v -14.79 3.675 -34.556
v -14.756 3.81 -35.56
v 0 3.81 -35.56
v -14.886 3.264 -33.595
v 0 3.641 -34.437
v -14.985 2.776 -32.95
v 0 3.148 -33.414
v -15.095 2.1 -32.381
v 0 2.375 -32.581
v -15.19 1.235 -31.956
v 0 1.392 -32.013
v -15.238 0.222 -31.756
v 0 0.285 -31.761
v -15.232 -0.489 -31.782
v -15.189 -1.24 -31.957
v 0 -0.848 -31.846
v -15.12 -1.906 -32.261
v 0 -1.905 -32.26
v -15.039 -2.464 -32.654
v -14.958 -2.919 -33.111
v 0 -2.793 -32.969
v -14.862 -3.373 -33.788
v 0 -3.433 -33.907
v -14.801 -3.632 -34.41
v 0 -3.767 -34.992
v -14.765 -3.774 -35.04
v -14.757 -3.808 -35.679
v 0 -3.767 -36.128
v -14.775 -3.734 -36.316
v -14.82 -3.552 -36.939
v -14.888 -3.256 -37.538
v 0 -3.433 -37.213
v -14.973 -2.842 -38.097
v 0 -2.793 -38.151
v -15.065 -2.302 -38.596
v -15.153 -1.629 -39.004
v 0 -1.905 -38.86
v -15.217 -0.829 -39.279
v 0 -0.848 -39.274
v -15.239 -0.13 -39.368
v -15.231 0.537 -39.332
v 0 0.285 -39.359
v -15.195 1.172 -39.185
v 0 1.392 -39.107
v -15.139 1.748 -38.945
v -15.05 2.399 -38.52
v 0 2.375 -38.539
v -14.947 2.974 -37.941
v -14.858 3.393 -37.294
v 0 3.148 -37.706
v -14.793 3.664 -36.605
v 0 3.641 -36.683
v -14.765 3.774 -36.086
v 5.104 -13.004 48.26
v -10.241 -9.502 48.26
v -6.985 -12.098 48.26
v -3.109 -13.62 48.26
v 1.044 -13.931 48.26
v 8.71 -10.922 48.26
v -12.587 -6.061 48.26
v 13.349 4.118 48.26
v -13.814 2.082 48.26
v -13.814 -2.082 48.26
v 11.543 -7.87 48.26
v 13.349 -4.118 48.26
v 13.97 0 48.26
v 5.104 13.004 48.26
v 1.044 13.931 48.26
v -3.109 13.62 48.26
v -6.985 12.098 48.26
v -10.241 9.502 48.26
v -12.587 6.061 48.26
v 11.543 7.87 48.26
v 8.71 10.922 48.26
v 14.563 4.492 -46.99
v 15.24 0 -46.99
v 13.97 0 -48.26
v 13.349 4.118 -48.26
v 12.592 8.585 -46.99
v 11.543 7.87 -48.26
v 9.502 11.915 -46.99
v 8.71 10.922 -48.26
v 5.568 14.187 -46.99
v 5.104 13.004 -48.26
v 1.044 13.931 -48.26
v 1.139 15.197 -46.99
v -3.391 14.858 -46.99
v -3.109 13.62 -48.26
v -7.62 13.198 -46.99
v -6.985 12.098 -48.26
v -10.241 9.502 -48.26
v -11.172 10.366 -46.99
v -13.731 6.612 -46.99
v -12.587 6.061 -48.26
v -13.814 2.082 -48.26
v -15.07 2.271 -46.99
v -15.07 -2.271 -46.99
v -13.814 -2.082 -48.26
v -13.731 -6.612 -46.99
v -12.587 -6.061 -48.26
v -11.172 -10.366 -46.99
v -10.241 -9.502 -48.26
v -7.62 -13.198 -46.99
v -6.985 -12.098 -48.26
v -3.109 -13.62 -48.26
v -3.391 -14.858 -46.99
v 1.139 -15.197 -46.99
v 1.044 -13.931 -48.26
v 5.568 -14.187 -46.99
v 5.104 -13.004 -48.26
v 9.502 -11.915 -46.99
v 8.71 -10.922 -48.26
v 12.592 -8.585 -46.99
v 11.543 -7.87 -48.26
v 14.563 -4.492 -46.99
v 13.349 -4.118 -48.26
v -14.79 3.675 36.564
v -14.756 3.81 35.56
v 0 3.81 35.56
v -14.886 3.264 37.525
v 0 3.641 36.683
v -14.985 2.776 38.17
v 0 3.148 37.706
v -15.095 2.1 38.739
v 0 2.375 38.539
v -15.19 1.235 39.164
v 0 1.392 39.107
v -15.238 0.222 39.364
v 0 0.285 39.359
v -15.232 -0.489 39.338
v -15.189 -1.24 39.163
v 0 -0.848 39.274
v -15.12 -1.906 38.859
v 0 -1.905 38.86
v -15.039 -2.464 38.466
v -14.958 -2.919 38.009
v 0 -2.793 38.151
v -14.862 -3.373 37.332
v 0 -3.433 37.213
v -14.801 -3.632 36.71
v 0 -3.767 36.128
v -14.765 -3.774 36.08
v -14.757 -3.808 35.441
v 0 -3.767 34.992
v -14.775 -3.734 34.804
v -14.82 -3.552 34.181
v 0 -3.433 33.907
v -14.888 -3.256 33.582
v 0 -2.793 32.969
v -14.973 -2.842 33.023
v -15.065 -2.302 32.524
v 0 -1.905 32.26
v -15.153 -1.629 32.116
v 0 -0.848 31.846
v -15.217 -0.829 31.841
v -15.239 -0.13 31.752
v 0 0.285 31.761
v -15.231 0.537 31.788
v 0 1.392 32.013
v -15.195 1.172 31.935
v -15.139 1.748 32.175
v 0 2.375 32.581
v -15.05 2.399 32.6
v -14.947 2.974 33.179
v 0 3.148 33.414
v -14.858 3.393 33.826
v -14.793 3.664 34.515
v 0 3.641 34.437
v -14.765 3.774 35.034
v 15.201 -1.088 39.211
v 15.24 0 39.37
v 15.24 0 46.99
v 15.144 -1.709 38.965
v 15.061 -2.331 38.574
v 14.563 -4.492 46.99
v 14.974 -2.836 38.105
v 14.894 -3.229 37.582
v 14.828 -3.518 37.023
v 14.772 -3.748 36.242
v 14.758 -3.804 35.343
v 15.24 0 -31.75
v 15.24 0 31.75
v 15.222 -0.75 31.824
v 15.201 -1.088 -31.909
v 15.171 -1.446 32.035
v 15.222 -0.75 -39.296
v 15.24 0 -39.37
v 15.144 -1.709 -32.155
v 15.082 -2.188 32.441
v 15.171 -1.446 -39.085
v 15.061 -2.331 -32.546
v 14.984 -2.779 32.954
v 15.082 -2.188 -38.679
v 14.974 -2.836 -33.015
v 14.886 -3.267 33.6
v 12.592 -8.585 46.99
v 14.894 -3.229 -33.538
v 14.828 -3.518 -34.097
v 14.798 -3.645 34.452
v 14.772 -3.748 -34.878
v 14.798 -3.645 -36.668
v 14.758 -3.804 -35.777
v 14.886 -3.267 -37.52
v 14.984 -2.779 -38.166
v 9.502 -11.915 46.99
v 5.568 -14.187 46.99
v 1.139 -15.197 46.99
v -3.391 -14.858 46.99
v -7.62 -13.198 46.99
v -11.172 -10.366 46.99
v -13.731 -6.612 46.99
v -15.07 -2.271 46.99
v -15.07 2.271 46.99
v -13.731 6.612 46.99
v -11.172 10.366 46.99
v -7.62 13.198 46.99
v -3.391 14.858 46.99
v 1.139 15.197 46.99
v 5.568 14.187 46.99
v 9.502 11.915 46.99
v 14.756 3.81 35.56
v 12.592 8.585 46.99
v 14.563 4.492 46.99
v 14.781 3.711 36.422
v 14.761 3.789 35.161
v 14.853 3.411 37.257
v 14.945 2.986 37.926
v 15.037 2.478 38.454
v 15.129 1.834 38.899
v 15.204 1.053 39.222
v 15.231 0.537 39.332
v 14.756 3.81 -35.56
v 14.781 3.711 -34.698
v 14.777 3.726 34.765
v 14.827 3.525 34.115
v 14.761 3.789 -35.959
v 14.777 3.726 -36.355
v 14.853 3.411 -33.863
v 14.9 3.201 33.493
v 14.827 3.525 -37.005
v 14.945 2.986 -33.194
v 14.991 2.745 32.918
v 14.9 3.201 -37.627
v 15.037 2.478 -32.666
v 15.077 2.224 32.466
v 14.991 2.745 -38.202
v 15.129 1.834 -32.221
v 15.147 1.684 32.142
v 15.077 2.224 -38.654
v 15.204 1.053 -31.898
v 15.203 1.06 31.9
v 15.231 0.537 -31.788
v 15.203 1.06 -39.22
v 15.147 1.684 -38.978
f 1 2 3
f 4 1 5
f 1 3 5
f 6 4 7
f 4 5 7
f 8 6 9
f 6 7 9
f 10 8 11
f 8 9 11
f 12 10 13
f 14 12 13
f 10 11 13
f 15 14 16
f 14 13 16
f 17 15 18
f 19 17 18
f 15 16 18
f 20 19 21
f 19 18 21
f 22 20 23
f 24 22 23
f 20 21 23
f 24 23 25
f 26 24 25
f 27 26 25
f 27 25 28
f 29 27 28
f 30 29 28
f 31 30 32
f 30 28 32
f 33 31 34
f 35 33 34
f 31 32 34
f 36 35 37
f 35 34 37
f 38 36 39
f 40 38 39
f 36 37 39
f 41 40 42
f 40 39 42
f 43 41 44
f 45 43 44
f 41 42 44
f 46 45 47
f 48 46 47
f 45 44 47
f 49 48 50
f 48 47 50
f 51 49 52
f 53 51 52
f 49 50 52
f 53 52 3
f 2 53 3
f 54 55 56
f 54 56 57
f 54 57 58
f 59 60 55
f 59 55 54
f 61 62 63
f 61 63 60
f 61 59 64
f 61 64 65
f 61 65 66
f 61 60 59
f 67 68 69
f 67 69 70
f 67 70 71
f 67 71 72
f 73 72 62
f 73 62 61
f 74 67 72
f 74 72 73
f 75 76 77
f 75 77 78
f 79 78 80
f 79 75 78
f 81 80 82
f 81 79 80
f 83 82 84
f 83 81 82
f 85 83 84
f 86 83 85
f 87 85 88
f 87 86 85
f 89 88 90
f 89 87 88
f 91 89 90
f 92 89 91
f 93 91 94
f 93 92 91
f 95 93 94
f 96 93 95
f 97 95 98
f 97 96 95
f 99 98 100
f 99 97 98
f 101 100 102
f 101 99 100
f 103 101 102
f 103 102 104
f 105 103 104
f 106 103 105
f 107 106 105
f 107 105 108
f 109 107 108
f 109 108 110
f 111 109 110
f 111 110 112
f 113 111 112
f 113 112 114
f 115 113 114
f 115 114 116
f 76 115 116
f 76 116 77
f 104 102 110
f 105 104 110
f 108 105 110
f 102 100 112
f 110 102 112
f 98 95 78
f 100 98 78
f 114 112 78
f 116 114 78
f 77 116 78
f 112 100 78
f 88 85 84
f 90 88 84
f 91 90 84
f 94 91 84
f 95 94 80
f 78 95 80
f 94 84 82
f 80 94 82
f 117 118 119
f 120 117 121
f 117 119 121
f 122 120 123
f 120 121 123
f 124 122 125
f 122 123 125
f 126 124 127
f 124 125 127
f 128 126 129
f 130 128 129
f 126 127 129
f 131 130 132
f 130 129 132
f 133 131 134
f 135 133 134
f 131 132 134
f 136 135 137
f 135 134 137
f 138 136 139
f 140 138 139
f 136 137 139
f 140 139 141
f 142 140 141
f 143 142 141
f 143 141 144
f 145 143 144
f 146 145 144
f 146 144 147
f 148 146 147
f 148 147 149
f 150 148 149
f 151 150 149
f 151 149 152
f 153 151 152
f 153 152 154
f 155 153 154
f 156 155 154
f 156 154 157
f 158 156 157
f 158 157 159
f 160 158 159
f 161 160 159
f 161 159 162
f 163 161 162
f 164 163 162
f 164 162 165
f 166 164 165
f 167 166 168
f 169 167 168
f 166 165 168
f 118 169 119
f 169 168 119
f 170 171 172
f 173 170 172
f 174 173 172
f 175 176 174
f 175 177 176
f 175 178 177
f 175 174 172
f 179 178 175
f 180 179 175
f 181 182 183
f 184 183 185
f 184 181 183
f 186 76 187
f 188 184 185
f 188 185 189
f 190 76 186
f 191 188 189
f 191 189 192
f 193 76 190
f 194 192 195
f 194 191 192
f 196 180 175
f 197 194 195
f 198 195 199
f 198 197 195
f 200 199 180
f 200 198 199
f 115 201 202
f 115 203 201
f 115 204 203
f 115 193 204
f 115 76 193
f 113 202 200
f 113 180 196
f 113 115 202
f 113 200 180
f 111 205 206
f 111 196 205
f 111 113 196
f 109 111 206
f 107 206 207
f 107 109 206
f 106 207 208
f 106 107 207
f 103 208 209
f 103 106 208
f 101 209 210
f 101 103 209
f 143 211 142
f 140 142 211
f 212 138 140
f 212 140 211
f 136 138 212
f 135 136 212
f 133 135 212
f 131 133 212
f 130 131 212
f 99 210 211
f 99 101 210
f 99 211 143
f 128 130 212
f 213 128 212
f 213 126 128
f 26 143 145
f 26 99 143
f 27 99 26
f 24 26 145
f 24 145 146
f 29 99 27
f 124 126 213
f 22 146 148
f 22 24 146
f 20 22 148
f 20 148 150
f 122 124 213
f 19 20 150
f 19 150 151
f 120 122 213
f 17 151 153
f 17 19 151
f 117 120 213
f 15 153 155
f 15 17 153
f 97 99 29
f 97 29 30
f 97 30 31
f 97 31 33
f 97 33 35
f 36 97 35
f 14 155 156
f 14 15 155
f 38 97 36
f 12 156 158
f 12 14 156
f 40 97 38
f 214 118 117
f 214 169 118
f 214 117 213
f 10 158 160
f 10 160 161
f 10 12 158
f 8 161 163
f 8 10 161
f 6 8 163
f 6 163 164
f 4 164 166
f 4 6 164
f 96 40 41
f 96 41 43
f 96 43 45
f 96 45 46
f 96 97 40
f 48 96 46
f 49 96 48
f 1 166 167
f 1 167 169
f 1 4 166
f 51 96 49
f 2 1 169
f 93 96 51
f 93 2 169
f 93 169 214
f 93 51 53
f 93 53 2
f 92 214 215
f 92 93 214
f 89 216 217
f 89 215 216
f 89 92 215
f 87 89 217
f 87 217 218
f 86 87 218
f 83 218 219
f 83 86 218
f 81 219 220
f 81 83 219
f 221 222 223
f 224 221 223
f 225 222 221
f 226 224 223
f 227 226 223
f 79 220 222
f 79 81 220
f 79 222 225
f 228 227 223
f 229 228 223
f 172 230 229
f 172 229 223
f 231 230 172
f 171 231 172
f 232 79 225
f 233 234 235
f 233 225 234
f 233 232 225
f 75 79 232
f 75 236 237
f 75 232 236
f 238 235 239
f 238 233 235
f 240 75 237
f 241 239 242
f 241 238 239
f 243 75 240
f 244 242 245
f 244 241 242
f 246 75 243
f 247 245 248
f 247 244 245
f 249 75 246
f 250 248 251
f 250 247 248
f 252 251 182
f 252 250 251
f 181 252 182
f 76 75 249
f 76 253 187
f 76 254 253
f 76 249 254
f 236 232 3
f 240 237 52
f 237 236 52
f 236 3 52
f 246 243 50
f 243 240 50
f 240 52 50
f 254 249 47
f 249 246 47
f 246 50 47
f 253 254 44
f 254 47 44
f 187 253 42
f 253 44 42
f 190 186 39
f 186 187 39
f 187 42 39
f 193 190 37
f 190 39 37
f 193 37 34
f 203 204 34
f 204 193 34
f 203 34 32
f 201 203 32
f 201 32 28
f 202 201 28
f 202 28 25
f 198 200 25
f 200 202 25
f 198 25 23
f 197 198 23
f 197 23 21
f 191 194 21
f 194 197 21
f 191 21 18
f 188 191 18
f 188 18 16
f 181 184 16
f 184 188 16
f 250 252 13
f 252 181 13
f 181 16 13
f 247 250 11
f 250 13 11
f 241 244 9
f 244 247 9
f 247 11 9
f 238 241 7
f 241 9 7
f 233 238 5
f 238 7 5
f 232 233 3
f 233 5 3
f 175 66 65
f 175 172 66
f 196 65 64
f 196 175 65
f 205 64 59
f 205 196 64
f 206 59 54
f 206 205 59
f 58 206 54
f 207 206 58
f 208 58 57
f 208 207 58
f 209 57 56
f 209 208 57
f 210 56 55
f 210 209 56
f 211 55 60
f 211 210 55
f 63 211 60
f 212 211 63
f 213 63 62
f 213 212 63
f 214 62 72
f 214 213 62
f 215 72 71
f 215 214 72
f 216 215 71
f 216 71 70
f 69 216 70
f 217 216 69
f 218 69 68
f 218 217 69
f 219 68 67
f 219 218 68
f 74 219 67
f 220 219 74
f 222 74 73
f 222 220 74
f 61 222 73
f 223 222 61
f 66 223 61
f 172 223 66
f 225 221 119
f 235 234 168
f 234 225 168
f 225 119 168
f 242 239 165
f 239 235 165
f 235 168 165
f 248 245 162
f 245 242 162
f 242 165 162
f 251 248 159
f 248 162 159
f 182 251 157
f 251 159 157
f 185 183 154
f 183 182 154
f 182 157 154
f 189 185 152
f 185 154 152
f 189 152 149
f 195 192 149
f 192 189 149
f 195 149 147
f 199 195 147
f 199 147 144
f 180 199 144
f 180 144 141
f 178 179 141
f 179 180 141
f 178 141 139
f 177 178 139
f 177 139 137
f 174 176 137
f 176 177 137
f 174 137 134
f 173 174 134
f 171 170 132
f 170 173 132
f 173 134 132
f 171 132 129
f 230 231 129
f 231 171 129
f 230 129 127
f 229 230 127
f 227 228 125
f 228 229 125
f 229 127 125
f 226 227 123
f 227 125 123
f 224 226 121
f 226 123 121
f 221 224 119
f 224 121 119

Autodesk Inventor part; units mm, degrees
ref_plane "YZ Plane" through (0, 0, 0) normal (1, 0, 0) x (0, 1, 0)
ref_plane "XZ Plane" through (0, 0, 0) normal (0, 1, 0) x (-1, 0, 0)
ref_plane "XY Plane" through (0, 0, 0) normal (0, 0, 1) x (1, 0, 0)
sketch "Sketch1" plane through (0, 0, 0) normal (0, 0, 1) x (1, 0, 0)
  circle A0 centre (0, 0) radius 15.24
  dimension "d0" = 30.48
extrude "Extrusion1" add sketch "Sketch1" along normal mid plane 96.52
sketch "Sketch2" plane through (0, 0, 0) normal (1, 0, 0) x (0, 1, 0)
  line L0 (15.24, -48.26) -> (-15.24, -48.26) projected
  line L1 (-15.24, -48.26) -> (-15.24, 48.26) projected
  line L2 (-15.24, 48.26) -> (15.24, 48.26) projected
  line L3 (15.24, 48.26) -> (15.24, -48.26) projected
  line L4 (-15.24, -48.26) -> (15.24, -48.26) projected
  line L5 (15.24, 48.26) -> (-15.24, 48.26) projected
  line L6 (-21.336, 0) -> (21.336, 0) projected
  line L7 (0, -67.564) -> (0, 67.564) projected
  circle A0 centre (0, 35.56) radius 3.81
  circle A1 centre (0, -35.56) radius 3.81
  point P0 (0, 0)
  dimension "d3" = 7.62
  dimension "d4" = 7.62
  dimension "d5" = 12.7
  dimension "d6" = 12.7
extrude "Extrusion2" cut sketch "Sketch2" against normal through all both and the other way through all contours A1 L7 | L7 A1 | A0 L7 | L7 A0
chamfer "Chamfer1" distance 1.27 angle 45 2 edges at (-15.24, 0, 48.26) (-15.24, 0, -48.26) measured on face at (9.6385, 11.805, 16.0867)
equation "\"BendRadius\" = Thickness"
equation "\"BendReliefWidth\" = Thickness"
equation "\"BendReliefDepth\" = 0.5 * Thickness"
equation "\"CornerReliefSize\" = 4 * Thickness"
equation "\"MinimumRemnant\" = 2 * Thickness"
equation "\"TransitionRadius\" = BendRadius"
equation "\"JacobiRadiusSize\" = BendRadius"
equation "\"GapSize\" = Thickness"
equation "\"Thickness\" = 3.048"
properties part number "crankshaft pin" material "Stainless Steel"
